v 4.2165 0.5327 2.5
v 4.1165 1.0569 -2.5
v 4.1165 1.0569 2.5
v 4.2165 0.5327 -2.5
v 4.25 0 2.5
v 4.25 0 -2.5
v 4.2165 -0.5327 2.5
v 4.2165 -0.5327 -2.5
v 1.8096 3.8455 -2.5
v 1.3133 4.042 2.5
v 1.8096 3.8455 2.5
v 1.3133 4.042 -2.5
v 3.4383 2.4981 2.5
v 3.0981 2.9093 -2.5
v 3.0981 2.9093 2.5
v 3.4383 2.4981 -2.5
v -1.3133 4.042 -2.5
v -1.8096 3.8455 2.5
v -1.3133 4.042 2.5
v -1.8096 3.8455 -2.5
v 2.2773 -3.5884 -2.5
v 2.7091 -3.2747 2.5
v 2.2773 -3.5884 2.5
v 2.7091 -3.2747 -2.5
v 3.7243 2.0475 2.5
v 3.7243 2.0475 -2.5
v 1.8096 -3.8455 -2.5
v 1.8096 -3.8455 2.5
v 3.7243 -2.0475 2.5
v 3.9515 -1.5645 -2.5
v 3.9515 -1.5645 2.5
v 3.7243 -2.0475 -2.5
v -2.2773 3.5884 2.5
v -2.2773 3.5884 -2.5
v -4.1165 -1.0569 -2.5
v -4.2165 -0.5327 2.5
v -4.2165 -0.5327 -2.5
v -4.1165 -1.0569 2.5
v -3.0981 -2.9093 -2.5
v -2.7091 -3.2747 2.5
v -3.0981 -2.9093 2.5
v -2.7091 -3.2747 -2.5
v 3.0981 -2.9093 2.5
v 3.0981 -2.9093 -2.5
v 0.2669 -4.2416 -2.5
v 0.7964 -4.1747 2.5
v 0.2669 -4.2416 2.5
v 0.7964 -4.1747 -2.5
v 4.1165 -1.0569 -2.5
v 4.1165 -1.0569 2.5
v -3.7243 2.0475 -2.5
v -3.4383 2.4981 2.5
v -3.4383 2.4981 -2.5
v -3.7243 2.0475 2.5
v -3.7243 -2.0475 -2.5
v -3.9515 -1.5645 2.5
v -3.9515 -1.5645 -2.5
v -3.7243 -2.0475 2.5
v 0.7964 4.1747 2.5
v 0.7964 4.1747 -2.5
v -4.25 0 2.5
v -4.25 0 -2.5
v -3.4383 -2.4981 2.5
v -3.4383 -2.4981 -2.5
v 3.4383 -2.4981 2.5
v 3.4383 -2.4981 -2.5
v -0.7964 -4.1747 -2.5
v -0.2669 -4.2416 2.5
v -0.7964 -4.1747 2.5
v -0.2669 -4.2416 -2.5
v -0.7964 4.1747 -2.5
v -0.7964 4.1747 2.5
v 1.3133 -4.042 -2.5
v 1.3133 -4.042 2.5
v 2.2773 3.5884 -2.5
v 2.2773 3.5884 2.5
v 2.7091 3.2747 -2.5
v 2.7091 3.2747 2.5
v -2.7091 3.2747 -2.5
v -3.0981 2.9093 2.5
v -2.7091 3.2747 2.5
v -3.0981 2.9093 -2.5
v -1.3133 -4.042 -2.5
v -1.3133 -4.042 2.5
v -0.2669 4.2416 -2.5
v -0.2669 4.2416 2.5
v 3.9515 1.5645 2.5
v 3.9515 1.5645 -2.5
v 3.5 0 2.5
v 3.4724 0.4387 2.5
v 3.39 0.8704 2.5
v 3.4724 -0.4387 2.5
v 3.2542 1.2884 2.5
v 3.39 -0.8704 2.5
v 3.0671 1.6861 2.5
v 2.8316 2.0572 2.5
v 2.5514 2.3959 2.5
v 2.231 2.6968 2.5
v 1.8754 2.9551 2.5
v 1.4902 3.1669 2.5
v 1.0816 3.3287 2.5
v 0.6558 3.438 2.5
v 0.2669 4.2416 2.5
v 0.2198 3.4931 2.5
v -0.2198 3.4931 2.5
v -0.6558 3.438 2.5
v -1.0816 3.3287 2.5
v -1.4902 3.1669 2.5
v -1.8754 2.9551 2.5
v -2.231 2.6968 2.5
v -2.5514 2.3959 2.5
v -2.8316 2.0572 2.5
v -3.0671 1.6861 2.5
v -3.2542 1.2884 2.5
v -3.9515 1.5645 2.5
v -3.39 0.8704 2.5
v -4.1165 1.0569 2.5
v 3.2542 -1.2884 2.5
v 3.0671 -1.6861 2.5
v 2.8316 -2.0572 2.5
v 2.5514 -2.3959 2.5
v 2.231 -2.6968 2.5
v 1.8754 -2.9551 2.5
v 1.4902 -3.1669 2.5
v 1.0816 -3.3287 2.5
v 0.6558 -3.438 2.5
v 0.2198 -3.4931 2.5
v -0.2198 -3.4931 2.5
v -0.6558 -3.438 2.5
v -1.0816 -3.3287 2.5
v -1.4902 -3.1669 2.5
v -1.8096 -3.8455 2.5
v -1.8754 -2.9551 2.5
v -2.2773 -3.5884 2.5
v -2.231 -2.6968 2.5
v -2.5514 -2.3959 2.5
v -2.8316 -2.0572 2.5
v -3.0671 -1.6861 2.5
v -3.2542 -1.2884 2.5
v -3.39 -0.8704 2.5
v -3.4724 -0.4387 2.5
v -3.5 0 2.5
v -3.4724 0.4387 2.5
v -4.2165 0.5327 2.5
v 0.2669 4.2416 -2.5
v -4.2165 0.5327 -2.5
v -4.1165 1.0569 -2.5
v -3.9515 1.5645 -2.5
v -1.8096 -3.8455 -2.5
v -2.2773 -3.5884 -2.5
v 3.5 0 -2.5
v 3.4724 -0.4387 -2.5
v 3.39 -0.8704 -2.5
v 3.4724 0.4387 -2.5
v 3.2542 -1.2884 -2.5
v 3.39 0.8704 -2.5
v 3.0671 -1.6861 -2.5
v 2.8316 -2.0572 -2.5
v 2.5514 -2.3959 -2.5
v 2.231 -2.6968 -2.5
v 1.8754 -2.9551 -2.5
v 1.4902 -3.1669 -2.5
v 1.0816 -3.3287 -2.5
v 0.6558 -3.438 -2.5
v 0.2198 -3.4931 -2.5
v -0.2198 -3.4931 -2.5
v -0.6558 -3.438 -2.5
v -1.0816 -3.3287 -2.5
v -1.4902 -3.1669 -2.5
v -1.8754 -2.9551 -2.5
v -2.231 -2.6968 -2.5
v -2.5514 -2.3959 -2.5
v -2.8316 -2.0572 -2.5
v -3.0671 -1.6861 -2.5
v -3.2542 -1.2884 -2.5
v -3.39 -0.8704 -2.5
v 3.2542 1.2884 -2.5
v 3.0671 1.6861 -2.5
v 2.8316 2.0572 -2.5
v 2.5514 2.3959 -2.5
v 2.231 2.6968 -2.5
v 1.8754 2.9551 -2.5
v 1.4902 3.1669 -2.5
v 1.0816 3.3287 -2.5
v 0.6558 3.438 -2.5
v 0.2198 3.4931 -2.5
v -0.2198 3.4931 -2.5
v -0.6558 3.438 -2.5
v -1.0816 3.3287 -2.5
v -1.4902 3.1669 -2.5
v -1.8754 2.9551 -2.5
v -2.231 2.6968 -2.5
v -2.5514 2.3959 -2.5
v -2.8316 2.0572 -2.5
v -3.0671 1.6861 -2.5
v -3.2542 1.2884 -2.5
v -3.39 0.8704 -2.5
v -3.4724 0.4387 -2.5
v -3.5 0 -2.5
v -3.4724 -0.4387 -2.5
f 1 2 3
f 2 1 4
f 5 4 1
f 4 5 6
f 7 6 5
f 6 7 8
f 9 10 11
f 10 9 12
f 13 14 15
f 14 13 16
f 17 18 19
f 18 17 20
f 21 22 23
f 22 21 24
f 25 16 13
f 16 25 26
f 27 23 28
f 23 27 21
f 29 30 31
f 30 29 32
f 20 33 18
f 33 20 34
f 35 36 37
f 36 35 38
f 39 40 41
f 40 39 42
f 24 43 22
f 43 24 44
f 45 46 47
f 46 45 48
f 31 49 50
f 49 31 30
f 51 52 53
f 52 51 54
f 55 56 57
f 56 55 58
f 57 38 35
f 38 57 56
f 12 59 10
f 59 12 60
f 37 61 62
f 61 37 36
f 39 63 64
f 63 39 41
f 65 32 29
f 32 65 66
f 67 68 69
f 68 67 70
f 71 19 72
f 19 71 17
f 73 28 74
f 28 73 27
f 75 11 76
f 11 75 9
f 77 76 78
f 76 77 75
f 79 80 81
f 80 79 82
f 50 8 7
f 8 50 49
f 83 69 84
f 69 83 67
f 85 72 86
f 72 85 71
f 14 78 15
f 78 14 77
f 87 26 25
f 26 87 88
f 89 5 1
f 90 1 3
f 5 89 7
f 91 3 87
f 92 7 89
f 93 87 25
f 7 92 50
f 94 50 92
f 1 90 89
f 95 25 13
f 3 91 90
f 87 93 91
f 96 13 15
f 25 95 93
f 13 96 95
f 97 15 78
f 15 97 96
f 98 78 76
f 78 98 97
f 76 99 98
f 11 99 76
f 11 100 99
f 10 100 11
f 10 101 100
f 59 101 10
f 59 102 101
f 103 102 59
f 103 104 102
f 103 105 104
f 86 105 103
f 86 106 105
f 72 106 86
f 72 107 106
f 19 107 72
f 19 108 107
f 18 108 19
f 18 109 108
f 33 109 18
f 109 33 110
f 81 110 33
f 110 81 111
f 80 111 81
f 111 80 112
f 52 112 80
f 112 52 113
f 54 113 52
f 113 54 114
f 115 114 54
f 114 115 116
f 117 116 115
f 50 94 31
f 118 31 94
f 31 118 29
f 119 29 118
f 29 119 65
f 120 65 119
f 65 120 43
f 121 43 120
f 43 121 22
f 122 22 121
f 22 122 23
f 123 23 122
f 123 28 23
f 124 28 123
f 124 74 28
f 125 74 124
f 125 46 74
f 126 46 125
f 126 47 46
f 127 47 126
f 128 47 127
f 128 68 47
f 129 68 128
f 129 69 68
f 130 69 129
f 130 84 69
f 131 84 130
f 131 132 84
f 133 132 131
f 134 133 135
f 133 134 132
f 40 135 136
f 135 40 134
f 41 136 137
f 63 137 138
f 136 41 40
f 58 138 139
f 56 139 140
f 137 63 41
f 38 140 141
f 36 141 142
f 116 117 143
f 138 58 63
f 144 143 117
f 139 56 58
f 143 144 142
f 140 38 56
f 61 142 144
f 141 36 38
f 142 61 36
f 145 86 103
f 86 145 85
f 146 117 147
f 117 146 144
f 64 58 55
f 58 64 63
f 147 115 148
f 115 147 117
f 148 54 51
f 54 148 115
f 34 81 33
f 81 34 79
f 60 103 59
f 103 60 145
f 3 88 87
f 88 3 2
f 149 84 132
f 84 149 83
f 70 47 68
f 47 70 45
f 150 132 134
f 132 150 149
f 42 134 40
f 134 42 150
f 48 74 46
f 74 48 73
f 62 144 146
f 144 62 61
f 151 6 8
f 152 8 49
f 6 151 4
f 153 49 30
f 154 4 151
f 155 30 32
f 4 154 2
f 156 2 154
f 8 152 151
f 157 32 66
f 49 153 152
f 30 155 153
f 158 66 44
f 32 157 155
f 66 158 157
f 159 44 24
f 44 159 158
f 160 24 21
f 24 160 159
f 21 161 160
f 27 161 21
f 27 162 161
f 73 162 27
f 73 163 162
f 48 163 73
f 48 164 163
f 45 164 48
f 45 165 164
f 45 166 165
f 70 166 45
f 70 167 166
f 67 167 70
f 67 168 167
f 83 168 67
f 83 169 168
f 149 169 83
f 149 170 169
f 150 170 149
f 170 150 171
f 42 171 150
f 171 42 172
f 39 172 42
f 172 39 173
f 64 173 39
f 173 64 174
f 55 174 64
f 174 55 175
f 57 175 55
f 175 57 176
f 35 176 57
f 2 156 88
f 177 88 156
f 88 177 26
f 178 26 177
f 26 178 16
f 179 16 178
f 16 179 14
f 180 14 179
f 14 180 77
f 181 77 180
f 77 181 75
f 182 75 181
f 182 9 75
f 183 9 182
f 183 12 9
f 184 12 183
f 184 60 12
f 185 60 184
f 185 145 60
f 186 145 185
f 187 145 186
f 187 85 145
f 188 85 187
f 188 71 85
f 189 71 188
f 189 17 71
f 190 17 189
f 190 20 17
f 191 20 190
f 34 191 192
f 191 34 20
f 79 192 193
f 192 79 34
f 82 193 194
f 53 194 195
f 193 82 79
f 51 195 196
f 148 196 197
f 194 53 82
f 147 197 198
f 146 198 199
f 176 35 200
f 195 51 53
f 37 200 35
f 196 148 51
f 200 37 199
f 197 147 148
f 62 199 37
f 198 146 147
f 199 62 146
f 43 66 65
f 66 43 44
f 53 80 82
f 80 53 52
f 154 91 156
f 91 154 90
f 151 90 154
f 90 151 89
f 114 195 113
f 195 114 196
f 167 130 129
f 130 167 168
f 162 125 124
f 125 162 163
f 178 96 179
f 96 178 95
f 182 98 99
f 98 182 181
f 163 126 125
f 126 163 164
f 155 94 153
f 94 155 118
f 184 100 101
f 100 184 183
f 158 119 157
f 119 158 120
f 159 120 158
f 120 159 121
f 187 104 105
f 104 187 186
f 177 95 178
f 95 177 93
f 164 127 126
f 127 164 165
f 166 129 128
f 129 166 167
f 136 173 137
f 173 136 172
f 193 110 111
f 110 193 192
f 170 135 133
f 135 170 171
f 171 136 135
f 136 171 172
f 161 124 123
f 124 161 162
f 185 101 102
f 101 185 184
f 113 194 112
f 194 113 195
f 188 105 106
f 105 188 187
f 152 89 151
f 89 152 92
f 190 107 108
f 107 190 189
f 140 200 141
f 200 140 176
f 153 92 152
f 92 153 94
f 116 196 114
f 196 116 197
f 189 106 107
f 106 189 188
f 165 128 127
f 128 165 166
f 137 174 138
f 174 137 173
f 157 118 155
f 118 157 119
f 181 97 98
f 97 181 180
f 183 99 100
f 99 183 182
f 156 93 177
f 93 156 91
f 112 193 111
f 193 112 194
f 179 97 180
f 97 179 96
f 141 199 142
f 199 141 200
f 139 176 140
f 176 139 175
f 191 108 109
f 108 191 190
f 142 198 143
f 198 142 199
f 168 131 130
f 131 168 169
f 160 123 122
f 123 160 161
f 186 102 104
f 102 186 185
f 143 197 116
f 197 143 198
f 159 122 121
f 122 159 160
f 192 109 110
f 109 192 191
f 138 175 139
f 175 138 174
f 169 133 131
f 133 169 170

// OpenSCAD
$fn = 50;


difference() {
	union() {
		translate(v = [0, 0, -2.5000000000]) {
			cylinder(h = 5, r = 4.2500000000);
		}
	}
	union() {
		translate(v = [0, 0, -100.0000000000]) {
			cylinder(h = 200, r = 3.5000000000);
		}
	}
}
